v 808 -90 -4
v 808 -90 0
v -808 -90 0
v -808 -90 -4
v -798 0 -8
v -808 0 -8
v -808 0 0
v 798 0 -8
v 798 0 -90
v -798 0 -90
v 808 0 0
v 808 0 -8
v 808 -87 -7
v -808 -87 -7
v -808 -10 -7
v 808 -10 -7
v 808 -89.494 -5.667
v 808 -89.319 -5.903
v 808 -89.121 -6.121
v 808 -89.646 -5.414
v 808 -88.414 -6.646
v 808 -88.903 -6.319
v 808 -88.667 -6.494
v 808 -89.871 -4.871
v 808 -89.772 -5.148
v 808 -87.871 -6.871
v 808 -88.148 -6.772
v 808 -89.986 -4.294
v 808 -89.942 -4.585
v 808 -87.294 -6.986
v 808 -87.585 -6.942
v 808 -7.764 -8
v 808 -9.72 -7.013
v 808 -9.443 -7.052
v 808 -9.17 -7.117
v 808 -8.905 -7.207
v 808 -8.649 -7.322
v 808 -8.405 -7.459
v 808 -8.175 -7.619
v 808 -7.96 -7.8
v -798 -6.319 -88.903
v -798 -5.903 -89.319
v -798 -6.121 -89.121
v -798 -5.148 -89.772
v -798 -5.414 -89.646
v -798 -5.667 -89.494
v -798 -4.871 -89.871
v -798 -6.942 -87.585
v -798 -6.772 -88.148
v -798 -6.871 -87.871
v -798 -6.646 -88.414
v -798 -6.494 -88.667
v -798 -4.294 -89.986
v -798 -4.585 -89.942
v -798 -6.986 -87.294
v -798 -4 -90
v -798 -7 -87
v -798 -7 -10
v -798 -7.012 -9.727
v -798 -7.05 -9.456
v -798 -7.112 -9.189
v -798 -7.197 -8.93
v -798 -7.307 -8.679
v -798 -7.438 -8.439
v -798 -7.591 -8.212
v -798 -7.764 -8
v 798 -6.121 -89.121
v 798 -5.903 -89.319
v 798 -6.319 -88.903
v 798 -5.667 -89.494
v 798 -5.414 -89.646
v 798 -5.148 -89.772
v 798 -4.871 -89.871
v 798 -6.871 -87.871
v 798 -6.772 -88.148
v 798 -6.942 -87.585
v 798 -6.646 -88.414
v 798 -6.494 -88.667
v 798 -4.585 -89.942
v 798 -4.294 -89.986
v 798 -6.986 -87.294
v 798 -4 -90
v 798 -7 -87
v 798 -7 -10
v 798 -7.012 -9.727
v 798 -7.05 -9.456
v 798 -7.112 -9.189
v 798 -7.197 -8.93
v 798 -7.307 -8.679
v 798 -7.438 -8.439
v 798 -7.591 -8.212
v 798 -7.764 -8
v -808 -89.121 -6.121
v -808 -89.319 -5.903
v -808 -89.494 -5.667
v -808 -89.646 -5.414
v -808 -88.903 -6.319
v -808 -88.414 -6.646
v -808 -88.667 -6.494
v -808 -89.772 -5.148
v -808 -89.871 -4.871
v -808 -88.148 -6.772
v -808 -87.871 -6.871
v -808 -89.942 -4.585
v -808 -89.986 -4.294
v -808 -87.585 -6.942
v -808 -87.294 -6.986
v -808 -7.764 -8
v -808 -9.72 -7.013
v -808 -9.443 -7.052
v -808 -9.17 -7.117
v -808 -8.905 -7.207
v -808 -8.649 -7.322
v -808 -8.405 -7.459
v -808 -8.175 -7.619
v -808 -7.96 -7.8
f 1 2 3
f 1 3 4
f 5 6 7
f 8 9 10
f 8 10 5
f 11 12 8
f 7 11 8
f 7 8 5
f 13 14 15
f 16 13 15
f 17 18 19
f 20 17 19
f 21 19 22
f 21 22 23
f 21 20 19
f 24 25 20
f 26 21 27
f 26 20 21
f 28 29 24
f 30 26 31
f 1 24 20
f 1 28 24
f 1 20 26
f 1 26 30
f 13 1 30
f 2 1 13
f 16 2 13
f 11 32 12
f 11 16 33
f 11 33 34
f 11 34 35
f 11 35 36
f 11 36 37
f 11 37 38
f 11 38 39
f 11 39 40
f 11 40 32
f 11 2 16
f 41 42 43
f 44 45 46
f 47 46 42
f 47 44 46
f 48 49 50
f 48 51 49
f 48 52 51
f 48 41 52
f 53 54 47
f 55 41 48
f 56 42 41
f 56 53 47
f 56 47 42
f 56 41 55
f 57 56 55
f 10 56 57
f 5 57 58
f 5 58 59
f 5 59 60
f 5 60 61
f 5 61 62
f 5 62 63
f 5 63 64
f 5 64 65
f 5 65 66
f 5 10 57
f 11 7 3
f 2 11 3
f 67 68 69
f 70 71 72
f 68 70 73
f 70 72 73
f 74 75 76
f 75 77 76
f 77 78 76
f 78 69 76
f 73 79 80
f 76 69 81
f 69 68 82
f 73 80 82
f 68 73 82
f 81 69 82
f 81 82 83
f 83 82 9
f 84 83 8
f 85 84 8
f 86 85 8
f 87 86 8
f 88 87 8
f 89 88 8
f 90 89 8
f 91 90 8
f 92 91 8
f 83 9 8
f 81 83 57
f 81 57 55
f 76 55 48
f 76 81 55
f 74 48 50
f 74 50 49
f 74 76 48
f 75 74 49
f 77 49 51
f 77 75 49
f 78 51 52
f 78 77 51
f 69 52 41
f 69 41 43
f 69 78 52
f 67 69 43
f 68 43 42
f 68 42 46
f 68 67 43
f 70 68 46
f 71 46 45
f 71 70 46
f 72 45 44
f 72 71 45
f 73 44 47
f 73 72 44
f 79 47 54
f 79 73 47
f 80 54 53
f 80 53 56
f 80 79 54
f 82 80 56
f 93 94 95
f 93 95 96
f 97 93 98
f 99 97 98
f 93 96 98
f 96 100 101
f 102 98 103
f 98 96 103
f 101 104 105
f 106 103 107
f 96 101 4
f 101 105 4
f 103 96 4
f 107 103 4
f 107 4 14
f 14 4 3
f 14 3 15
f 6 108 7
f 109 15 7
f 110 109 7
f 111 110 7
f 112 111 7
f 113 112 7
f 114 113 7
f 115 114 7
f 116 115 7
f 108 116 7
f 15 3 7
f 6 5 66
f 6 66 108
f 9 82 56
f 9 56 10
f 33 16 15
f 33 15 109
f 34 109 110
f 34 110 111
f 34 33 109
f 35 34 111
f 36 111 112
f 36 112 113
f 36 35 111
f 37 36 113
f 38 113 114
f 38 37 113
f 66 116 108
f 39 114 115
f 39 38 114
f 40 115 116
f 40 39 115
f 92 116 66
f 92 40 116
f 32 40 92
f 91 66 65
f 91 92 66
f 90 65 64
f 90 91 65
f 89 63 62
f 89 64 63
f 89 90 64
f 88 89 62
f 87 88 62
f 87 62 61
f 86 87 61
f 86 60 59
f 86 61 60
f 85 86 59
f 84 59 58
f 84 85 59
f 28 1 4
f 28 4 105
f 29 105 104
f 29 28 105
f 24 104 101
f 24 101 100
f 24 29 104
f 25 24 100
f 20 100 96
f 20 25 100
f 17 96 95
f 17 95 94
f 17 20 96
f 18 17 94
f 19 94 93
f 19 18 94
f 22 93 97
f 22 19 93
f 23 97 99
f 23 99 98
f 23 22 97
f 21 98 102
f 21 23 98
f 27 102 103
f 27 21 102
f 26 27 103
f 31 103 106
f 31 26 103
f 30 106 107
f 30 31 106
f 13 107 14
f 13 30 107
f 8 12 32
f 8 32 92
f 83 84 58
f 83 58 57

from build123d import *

# Parameters (mm, degrees)
F1_DEPTH = 808
F2_W     = 10
F2_H     = 82
F3_DEPTH = 25


with BuildPart() as f1:
    # F0 (on Right) → F1 (new body, symmetric)
    with BuildSketch(Plane.YZ):
        with BuildLine():
            Line((0, -90), (0, 0))
            Line((0, 0), (-90, 0))
            Line((-90, 0), (-90, -4))
            ThreePointArc((-90, -4), (-89.12132, -6.12132), (-87, -7))
            Line((-87, -7), (-10, -7))
            ThreePointArc((-10, -7), (-7.87868, -7.87868), (-7, -10))
            Line((-7, -10), (-7, -87))
            ThreePointArc((-7, -87), (-6.12132, -89.12132), (-4, -90))
            Line((-4, -90), (0, -90))
        make_face()
    extrude(amount=F1_DEPTH, both=True)

    # F2 (on face) → F3 (cut)
    with BuildSketch(Plane(origin=(0, 0, 0), x_dir=(-1, 0, 0), z_dir=(0, 1, 0))):
        with Locations((-803, -49)):
            Rectangle(F2_W, F2_H)
        with Locations((803, -49)):
            Rectangle(F2_W, F2_H)
    extrude(amount=-F3_DEPTH, mode=Mode.SUBTRACT)


solid = f1.part
